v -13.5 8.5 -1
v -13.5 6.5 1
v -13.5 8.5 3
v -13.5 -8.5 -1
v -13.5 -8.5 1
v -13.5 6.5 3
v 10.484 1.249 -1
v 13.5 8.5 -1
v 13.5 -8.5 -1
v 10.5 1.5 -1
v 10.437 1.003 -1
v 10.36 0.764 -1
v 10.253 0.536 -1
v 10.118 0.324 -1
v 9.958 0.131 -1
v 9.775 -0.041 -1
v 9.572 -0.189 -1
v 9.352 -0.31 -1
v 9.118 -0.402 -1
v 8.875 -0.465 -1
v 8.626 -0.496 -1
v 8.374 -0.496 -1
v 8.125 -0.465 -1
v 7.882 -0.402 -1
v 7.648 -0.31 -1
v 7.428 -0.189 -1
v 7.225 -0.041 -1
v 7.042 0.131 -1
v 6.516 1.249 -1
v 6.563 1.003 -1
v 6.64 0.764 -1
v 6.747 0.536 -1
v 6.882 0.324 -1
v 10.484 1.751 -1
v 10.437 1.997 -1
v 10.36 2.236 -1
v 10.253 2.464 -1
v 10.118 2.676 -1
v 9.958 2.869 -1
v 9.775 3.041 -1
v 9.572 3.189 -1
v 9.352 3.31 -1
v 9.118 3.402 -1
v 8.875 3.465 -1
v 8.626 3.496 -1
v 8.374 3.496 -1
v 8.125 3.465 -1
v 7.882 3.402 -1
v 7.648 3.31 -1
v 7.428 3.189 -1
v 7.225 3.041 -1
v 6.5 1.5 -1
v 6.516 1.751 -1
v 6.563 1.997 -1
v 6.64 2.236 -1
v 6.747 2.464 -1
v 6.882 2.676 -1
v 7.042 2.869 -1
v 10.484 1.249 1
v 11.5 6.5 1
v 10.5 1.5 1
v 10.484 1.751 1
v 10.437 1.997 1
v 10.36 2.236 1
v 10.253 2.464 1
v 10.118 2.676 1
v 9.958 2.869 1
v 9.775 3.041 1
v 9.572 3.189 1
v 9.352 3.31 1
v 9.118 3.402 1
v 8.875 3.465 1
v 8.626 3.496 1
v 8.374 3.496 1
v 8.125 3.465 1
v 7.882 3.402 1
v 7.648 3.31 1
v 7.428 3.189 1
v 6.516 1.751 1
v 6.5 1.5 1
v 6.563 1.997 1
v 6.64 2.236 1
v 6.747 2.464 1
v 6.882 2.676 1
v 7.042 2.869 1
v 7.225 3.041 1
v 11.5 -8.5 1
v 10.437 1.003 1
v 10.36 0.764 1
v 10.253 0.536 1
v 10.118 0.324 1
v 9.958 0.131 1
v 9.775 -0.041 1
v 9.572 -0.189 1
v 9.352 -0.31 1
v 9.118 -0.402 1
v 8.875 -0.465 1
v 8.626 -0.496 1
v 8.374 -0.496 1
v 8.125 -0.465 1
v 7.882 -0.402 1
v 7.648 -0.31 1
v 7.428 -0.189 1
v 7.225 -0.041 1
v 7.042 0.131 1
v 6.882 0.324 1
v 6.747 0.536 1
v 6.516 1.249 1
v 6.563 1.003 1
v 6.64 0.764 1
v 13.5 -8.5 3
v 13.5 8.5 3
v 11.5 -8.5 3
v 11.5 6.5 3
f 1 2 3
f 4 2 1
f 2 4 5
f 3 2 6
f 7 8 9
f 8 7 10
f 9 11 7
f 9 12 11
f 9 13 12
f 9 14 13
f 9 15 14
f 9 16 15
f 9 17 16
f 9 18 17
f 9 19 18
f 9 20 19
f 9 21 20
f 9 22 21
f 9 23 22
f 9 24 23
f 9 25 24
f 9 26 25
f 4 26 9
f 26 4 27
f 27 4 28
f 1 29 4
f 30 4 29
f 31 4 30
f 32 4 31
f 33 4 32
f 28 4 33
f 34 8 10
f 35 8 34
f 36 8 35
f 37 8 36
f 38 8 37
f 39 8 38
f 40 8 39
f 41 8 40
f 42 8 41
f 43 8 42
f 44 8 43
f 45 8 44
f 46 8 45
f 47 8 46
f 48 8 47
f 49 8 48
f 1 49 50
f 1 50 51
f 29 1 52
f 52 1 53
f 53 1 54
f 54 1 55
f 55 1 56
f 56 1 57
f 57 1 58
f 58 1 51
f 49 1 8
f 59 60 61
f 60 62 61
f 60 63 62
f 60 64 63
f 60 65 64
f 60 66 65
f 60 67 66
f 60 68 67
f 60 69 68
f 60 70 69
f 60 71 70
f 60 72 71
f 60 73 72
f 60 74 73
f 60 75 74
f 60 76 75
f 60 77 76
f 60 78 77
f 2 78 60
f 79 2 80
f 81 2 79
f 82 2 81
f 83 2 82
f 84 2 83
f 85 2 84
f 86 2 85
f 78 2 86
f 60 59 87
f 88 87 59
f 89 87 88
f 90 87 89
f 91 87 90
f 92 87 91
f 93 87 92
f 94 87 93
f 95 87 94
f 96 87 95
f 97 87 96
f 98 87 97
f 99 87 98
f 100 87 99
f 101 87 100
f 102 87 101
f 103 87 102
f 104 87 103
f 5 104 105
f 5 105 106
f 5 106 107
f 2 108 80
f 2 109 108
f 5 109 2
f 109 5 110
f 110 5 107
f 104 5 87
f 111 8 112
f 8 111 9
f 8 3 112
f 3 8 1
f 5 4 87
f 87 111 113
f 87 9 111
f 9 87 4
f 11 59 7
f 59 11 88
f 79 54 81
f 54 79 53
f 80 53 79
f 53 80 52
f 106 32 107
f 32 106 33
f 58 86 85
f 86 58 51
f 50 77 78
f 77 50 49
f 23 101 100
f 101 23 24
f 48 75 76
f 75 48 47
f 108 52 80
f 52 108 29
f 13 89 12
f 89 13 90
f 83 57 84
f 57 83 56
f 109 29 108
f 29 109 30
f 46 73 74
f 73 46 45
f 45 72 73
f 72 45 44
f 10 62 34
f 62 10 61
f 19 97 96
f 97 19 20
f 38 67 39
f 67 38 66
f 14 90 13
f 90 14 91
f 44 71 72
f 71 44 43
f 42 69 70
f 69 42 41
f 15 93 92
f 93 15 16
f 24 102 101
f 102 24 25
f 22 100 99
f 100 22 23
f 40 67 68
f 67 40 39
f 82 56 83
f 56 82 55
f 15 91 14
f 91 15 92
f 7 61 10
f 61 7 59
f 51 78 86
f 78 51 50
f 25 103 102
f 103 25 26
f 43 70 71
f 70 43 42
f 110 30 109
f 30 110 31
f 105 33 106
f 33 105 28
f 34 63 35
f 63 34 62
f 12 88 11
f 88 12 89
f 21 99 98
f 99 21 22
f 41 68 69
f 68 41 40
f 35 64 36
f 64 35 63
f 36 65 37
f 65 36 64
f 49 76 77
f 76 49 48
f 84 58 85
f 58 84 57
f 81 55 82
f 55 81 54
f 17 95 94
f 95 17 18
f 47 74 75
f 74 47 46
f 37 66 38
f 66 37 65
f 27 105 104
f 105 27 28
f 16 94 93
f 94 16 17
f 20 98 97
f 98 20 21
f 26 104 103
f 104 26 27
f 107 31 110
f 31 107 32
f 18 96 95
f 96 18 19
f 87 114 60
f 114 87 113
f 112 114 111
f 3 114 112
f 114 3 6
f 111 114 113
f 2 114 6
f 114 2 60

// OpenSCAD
//patriks dators reservdel, Acer.


module removecylinderfromcube(roundingradius,height,rot){

rotate([0,0,rot]){
	difference(){
	cube([roundingradius,roundingradius,height],center=true);
	translate([roundingradius/2,roundingradius/2,1])
	cylinder(r = roundingradius, h = height, center = true);		
	}
	}
}

module asuspart(debug){


partwidth=17;
partheight=2;  //TODO FIXME REAL STUFFS5;
partlength=27;
roundingradius =5/2;
boreholeradius=2;
$fn=50;
borderwidth=2;
borderheight=2;
boreholexoffset=6;
boreholeyoffset=8;


rotate([0,180,0]){


union(){


translate([-partlength/2+borderwidth/2,0,-partheight])
cube([borderwidth,partwidth,borderheight],center=true);



translate([0,partwidth/2 -borderwidth/2,-partheight])
cube([partlength,borderwidth,borderheight],center=true);

difference(){
	cube([partlength,partwidth,partheight],center=true);
//	translate([-(partlength/2  -roundingradius/2),partwidth/2  - roundingradius/2])
//	removecylinderfromcube(roundingradius,partheight,-90);
	
	translate([-partlength/2+ (boreholexoffset-boreholeradius/2 ) ,partwidth/2  -boreholeyoffset+boreholeradius/2])
	cylinder(r = boreholeradius, h = partheight, center = true);	
	
	}

	
}
	
	
	}
	
	
/*
difference(){
cube([partlength,partwidth,partheight],center=true);

translate([-(partlength/2  -roundingradius),partwidth/2  - roundingradius])
cylinder(r = roundingradius, h = partheight, center = true);
	
}

r2 =  r-t;

difference() {
	cylinder(r = r, h = h, center = true);
	cylinder(r = r2, h = h+1, center = true);
	}
}

//makes a cylinder with four cylinders inside, optionally connecting them.
module 4ci1c(o_radius,i_radius,thickness,height,connect_inner_cylinders)
{
//oc == outercylinder, ic == innercylinder

//computed, normalized values.

//quality!
$fn=50;

ic_h=height;
ic_r=i_radius;
ic_t=thickness;

oc_h=ic_h;
oc_r=o_radius;              
oc_t=thickness;

ic_offset=oc_r-ic_r;

c_offset=ic_offset/2;  
c_length=sqrt(pow(ic_offset,2)*2)-(ic_r*2);

module connector(offset1,offset2,rot) {
		translate([offset1,offset2,0])
		rotate([0,0,rot])
		cube([thickness,c_length,height],center=true);	
	}
	
module innercylinder(offset1,offset2) {
		translate([offset1,offset2,0])
		cylshell(ic_r, ic_h,ic_t);
	}	
	
union(){
	innercylinder(0,ic_offset);
	innercylinder(0,-ic_offset);
	innercylinder(ic_offset,0);
	innercylinder(-ic_offset,0);

	cylshell(oc_r, oc_h,oc_t);
		
	if(connect_inner_cylinders){
		connector(c_offset,c_offset,45);
		connector(c_offset,-c_offset,-45);
		connector(-c_offset,-c_offset,45);
		connector(-c_offset,c_offset,-45);
		}
	}
	
	*/
	
}

asuspart(true);
